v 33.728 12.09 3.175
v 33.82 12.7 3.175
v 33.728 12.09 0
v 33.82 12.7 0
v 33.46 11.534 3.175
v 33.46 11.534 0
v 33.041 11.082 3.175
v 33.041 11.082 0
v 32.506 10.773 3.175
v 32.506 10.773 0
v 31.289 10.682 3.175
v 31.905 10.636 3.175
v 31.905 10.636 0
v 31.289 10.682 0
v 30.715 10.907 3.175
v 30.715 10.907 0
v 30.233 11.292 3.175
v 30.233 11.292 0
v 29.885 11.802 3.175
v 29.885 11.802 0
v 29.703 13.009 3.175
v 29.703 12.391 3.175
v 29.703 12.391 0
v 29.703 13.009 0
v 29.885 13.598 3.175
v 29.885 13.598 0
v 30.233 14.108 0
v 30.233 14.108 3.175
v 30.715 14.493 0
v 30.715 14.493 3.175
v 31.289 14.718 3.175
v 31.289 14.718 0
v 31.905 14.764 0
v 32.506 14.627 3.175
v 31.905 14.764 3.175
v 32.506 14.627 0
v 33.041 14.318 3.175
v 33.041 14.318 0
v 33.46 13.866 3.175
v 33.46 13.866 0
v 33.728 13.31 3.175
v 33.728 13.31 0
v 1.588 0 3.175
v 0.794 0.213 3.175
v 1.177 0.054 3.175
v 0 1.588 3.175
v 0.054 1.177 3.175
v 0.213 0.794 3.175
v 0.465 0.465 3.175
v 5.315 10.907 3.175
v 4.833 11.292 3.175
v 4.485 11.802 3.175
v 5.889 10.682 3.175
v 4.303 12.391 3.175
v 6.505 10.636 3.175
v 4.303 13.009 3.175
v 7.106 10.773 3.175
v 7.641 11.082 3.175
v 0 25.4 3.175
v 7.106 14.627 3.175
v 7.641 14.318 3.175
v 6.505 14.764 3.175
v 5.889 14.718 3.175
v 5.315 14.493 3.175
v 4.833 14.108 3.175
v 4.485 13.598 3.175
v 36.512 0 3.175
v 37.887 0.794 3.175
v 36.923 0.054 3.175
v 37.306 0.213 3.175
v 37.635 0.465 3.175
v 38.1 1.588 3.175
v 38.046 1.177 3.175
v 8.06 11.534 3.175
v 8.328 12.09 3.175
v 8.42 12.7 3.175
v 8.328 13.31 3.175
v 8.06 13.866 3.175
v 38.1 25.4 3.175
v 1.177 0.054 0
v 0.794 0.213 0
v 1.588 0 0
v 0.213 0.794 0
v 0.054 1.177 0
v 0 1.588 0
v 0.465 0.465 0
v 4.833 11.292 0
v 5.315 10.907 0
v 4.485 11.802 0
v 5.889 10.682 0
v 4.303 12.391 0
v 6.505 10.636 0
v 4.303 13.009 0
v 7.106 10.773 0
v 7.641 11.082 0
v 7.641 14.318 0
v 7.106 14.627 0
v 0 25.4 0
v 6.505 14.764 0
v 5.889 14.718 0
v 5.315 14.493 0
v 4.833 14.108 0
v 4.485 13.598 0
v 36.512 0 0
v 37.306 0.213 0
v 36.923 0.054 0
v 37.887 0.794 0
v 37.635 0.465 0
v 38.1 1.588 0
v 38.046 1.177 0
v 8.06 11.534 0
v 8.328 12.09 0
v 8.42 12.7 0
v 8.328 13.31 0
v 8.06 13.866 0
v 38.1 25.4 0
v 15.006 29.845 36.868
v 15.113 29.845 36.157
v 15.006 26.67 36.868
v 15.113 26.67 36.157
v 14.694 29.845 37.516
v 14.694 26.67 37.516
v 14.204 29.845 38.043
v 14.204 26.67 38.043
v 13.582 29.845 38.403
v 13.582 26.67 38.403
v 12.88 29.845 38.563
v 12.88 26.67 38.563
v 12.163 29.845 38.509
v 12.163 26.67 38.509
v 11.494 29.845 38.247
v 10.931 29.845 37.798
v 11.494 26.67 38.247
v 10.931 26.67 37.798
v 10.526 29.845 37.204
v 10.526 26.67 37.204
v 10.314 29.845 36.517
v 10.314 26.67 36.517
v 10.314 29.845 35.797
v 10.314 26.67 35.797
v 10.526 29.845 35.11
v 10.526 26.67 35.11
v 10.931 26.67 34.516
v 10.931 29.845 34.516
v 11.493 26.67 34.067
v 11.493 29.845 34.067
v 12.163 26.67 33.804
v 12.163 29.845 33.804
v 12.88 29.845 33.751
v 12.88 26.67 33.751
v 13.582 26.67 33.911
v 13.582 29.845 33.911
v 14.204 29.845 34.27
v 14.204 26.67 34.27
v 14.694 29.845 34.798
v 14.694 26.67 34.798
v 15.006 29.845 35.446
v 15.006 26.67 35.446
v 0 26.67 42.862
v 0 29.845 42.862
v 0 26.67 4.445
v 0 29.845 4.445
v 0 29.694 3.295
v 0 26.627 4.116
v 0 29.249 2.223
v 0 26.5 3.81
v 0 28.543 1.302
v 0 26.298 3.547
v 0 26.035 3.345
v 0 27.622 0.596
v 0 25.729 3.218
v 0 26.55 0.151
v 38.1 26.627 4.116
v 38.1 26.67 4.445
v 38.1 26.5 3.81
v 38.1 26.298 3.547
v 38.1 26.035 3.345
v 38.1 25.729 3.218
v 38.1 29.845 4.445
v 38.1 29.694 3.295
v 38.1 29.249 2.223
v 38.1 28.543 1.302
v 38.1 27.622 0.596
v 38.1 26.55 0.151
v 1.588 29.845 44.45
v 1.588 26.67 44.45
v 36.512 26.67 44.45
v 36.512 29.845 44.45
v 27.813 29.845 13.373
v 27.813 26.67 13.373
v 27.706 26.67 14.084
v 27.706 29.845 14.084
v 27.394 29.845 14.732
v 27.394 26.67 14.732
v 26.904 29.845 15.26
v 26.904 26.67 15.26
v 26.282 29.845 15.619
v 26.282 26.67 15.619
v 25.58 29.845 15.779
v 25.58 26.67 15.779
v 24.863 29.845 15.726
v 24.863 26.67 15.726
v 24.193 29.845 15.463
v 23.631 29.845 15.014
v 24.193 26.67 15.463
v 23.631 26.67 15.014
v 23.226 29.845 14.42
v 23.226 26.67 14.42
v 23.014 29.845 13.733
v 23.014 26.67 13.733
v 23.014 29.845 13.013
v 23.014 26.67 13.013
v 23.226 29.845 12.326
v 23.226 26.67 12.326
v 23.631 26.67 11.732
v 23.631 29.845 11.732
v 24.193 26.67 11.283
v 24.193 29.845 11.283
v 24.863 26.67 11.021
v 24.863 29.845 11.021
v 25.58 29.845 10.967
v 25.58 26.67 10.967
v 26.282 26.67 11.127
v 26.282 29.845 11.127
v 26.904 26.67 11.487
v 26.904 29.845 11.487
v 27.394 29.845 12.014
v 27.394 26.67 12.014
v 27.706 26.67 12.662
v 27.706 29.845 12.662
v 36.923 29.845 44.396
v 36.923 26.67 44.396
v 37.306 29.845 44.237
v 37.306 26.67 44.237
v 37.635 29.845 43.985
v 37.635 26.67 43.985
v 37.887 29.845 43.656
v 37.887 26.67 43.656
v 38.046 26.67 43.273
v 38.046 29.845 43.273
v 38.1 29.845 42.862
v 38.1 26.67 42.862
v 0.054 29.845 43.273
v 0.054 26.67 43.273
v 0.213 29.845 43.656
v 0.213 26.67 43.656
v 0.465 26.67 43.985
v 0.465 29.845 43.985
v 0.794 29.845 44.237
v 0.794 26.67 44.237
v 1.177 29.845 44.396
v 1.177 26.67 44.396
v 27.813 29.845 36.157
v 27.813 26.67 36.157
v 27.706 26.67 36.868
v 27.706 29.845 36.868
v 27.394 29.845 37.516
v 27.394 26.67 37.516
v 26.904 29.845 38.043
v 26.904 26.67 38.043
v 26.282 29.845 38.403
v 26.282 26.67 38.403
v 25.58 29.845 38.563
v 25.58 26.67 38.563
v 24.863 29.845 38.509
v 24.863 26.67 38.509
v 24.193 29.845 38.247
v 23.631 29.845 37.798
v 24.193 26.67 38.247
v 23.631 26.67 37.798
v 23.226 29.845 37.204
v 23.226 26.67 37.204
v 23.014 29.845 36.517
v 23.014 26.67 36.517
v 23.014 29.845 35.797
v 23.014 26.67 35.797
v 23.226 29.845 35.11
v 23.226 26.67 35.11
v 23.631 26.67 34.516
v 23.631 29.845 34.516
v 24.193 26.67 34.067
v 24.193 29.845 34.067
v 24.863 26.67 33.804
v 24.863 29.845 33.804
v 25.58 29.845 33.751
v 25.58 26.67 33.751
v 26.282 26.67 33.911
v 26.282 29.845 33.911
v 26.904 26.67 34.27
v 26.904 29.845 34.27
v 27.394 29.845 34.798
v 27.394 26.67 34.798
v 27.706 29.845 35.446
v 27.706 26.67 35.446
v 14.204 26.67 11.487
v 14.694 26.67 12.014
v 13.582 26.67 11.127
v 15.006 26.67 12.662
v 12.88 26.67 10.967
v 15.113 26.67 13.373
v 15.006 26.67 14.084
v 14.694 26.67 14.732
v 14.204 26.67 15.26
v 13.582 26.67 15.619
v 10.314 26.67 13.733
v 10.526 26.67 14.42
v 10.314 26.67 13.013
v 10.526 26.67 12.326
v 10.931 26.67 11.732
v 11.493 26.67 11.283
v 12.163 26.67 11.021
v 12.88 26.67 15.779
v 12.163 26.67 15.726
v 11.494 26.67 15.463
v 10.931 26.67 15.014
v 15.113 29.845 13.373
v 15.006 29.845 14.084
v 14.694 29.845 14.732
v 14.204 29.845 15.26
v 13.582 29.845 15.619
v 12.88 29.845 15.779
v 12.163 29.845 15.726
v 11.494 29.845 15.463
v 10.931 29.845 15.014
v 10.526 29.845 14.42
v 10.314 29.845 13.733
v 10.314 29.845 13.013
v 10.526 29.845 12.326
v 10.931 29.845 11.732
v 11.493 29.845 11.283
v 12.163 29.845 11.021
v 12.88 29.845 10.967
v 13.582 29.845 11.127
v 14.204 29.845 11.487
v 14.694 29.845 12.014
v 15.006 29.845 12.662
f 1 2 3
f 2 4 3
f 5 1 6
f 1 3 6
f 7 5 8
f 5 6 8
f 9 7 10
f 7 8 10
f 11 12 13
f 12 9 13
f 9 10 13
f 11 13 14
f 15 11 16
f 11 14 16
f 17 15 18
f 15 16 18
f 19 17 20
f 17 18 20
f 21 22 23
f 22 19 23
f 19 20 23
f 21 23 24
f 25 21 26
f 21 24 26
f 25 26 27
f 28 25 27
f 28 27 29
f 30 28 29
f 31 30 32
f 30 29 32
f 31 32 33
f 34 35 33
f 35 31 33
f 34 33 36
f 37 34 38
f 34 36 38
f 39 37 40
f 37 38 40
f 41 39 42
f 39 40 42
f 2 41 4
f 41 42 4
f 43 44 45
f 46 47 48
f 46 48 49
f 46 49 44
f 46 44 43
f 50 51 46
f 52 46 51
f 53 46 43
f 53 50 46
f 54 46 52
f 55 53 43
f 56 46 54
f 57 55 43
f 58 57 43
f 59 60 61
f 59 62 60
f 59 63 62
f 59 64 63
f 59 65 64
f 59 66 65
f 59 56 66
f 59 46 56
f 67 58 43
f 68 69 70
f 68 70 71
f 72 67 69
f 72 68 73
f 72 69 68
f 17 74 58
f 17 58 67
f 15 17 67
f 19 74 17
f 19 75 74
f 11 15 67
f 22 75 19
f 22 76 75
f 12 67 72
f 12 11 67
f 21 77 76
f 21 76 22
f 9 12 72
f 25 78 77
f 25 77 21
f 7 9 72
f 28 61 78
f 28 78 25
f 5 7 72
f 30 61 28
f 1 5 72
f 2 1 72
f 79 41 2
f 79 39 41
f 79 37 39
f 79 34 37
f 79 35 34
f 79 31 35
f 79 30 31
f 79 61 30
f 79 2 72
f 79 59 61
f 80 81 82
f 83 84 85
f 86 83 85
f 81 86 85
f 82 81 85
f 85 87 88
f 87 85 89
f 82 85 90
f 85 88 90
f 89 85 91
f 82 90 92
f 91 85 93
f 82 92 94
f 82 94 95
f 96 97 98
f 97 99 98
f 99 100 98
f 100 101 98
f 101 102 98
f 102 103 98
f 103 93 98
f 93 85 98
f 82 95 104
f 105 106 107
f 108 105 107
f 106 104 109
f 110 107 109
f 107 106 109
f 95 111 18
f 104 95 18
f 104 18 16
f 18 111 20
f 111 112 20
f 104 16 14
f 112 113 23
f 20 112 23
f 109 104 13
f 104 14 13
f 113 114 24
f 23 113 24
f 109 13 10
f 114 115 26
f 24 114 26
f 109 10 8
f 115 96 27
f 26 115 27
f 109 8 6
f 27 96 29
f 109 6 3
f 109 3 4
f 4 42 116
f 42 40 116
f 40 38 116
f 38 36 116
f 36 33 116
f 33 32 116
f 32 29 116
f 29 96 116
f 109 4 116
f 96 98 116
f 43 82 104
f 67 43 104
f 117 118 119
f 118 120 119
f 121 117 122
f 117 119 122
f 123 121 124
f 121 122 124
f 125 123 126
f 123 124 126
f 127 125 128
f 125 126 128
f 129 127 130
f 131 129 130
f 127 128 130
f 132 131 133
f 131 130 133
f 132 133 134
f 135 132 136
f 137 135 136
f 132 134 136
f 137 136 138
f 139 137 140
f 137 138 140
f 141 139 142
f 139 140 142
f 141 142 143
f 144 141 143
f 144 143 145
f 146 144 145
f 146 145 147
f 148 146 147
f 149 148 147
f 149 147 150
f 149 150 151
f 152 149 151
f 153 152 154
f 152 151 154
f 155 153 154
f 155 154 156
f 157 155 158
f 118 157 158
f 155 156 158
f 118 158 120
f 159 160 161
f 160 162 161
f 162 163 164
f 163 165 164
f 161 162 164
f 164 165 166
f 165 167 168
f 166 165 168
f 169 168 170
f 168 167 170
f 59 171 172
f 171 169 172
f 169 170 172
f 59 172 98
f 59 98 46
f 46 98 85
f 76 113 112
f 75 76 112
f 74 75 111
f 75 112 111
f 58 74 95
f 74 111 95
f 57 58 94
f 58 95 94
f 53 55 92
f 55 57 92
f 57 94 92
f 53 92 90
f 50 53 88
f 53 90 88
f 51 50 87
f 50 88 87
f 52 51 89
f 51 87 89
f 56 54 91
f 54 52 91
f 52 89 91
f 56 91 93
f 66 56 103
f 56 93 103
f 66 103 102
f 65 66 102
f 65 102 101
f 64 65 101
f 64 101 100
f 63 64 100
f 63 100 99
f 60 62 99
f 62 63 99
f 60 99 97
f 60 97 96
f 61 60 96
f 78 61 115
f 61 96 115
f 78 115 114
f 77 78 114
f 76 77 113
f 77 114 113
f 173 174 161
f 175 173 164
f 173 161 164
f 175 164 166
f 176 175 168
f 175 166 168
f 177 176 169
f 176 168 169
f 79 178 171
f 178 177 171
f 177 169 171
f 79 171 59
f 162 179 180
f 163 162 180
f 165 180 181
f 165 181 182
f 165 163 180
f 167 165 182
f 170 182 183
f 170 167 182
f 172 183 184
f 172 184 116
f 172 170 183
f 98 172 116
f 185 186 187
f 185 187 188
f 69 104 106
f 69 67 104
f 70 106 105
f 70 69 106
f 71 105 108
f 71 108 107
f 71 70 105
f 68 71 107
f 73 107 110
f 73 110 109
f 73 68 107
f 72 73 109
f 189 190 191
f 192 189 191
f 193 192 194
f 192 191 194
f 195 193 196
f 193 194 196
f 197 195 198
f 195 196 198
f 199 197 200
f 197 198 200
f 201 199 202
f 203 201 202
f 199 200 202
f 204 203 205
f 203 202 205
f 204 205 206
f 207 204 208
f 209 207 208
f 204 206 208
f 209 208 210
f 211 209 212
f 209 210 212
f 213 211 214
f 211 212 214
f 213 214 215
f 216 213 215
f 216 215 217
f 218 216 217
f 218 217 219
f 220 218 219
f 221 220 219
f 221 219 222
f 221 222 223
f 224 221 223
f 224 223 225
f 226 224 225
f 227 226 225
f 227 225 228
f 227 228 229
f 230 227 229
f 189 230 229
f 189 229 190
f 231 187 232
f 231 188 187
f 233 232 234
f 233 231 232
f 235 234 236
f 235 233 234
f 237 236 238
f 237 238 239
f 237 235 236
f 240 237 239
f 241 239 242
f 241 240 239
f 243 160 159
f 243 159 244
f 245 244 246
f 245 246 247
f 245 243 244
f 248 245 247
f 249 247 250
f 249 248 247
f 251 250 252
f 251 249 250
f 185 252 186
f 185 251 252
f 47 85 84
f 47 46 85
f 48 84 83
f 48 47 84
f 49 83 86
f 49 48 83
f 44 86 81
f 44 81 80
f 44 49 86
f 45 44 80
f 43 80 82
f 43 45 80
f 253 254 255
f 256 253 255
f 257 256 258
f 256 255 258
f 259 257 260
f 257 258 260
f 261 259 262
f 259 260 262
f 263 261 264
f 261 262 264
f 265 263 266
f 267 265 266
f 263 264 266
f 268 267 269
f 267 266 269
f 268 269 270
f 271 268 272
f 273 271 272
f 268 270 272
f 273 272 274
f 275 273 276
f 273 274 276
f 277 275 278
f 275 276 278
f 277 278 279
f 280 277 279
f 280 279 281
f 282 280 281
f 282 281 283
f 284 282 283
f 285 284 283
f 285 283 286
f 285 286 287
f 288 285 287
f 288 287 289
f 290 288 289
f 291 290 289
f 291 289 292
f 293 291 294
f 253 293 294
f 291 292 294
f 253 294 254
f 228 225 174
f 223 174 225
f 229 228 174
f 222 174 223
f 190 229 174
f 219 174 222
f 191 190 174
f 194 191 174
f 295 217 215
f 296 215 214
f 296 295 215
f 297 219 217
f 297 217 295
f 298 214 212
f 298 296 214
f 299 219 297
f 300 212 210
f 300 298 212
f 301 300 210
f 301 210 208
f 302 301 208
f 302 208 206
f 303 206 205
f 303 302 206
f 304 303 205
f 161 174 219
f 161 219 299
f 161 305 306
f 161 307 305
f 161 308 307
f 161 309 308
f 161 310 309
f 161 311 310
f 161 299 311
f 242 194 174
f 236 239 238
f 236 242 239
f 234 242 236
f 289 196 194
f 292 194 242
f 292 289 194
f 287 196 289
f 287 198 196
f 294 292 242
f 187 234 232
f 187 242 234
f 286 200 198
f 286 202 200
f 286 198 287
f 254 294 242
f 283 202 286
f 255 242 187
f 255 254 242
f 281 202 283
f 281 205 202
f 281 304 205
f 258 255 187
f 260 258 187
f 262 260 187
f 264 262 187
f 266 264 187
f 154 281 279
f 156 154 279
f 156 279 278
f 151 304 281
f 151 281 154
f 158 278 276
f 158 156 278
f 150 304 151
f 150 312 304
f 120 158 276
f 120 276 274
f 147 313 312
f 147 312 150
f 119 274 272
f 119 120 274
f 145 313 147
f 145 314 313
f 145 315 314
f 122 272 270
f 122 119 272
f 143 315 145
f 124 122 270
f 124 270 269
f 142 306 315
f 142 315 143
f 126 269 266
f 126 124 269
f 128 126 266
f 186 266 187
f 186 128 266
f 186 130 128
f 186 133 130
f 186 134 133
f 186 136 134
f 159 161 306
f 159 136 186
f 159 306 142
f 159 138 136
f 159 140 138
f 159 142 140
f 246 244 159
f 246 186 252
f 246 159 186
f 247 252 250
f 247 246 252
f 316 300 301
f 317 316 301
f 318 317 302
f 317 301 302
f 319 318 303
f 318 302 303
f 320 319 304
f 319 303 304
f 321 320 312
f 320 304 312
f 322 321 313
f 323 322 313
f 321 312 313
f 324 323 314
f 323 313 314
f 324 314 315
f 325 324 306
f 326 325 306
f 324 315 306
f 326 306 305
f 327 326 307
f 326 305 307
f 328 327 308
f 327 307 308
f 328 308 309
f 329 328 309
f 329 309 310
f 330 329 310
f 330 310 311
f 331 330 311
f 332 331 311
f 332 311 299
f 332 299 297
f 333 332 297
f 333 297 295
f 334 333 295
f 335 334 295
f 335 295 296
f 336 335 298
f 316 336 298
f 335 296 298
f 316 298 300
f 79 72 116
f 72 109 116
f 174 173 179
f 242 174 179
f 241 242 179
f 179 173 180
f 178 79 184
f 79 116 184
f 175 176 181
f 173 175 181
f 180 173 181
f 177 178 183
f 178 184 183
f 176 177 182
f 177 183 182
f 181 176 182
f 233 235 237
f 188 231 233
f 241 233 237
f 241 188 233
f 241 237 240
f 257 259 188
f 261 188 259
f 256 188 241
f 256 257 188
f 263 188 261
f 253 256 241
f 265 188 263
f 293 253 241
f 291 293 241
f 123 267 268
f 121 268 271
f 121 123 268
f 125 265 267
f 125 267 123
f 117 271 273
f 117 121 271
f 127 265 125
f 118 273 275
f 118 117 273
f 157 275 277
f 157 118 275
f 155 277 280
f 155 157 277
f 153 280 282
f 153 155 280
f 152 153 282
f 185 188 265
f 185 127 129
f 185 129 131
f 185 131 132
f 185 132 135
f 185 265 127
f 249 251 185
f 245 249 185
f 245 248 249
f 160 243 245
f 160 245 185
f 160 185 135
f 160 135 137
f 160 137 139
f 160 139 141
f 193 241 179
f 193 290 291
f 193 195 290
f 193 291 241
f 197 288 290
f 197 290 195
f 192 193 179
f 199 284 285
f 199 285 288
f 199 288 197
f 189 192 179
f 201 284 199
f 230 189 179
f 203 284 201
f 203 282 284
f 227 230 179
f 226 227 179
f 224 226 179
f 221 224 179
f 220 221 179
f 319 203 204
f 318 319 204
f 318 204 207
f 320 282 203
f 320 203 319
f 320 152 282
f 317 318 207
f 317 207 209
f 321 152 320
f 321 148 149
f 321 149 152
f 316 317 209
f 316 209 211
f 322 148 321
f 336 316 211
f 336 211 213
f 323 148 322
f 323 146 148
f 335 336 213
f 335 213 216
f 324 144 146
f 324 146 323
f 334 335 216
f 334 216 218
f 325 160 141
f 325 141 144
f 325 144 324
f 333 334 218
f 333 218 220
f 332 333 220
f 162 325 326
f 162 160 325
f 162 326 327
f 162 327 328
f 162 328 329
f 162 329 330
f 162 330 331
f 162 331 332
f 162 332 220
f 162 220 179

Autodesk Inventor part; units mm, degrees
ref_plane "YZ Plane" through (0, 0, 0) normal (1, 0, 0) x (0, 1, 0)
ref_plane "XZ Plane" through (0, 0, 0) normal (0, 1, 0) x (-1, 0, 0)
ref_plane "XY Plane" through (0, 0, 0) normal (0, 0, 1) x (1, 0, 0)
sketch "Sketch1" plane through (0, 0, 0) normal (0, 0, 1) x (1, 0, 0)
  line L0 (0, 0) -> (38.1, 0)
  line L1 (38.1, 0) -> (38.1, 25.4)
  line L2 (38.1, 25.4) -> (0, 25.4)
  line L3 (0, 25.4) -> (0, 0)
  circle A0 centre (6.35, 12.7) radius 2.0701
  line L4 (0, 12.7) -> (38.1, 12.7) construction
  circle A1 centre (31.75, 12.7) radius 2.0701
  dimension "d0" = 38.1
  dimension "d1" = 25.4
  dimension "d2" = 4.1402
  dimension "d3" = 6.35
  dimension "d6" = 25.4
extrude "Plate1" add sketch "Sketch1" along normal blind 3.175
sketch "Sketch2" plane through (0, 26.67, 4.445) normal (0, 1, 0) x (-1, 0, 0)
  line L0 (-38.1, 0) -> (0, 0)
  line L1 (0, 0) -> (0, 40.005)
  line L2 (0, 40.005) -> (-38.1, 40.005)
  line L3 (-38.1, 40.005) -> (-38.1, 0)
edge flange "Flange1" height 44.45 angle 90 thickness 3.175 bend radius 1.27 thickness toward (0, 1, 0) relief tear relief width 3.175 relief depth 1.5875 edges at (19.05, 25.4, 3.175) wall of the first edge with corners at (38.1, 26.67, 4.445) (0, 26.67, 4.445) (0, 26.67, 44.45) (38.1, 26.67, 44.45)
bend "Bend1"
corner "Corner1"
fillet "Fillet1" radius 1.5875 4 edges at (38.1, 0, 1.5875) (0, 0, 1.5875) (38.1, 28.2575, 44.45) (0, 28.2575, 44.45)
sketch "Sketch3" plane through (0, 26.67, 4.445) normal (0, -1, 0) x (1, 0, 0)
  line L0 (0, 38.4175) -> (0, 0) projected
  line L1 (0, 0) -> (38.1, 0) projected
  line L2 (9.525, 37.465) -> (28.575, 37.465) construction
  line L3 (28.575, 37.465) -> (28.575, 3.175) construction
  line L4 (28.575, 3.175) -> (9.525, 3.175) construction
  line L5 (9.525, 3.175) -> (9.525, 37.465) construction
  circle A0 centre (25.4, 31.7119) radius 2.413
  line L6 (19.05, 37.465) -> (19.05, 3.175) construction
  line L7 (9.525, 20.32) -> (28.575, 20.32) construction
  circle A1 centre (12.7, 31.7119) radius 2.413
  circle A2 centre (25.4, 8.9281) radius 2.413
  circle A3 centre (12.7, 8.9281) radius 2.413
  point P0 (0, -4.445)
  dimension "d23" = 34.29
  dimension "d24" = 19.05
  dimension "d25" = 3.175
  dimension "d26" = 9.525
  dimension "d27" = 4.826
  dimension "d28" = 3.175
  dimension "d29" = 5.7531
extrude "Extrusion1" cut sketch "Sketch3" against normal blind 25.4
equation "\"d12\" = BendReliefWidth"
equation "\"d13\" = BendReliefDepth"
equation "\"d14\" = MinimumRemnant"
equation "\"d15\" = BendRadius"
equation "\"d19\" = CornerReliefSize"
equation "\"d20\" = GapSize"
equation "\"d21\" = JacobiRadiusSize"
equation "\"BendRadius\" = Thickness"
equation "\"BendReliefWidth\" = Thickness"
equation "\"BendReliefDepth\" = 0.5 * Thickness"
equation "\"CornerReliefSize\" = 4 * Thickness"
equation "\"MinimumRemnant\" = 2 * Thickness"
equation "\"TransitionRadius\" = BendRadius"
equation "\"JacobiRadiusSize\" = BendRadius"
equation "\"GapSize\" = Thickness"
equation "\"d11\" = BendRadius"
equation "\"Thickness\" = 3.175"
properties part number "Pneumatic Piston Back Flange (Custom)" material "Aluminum 6061"
